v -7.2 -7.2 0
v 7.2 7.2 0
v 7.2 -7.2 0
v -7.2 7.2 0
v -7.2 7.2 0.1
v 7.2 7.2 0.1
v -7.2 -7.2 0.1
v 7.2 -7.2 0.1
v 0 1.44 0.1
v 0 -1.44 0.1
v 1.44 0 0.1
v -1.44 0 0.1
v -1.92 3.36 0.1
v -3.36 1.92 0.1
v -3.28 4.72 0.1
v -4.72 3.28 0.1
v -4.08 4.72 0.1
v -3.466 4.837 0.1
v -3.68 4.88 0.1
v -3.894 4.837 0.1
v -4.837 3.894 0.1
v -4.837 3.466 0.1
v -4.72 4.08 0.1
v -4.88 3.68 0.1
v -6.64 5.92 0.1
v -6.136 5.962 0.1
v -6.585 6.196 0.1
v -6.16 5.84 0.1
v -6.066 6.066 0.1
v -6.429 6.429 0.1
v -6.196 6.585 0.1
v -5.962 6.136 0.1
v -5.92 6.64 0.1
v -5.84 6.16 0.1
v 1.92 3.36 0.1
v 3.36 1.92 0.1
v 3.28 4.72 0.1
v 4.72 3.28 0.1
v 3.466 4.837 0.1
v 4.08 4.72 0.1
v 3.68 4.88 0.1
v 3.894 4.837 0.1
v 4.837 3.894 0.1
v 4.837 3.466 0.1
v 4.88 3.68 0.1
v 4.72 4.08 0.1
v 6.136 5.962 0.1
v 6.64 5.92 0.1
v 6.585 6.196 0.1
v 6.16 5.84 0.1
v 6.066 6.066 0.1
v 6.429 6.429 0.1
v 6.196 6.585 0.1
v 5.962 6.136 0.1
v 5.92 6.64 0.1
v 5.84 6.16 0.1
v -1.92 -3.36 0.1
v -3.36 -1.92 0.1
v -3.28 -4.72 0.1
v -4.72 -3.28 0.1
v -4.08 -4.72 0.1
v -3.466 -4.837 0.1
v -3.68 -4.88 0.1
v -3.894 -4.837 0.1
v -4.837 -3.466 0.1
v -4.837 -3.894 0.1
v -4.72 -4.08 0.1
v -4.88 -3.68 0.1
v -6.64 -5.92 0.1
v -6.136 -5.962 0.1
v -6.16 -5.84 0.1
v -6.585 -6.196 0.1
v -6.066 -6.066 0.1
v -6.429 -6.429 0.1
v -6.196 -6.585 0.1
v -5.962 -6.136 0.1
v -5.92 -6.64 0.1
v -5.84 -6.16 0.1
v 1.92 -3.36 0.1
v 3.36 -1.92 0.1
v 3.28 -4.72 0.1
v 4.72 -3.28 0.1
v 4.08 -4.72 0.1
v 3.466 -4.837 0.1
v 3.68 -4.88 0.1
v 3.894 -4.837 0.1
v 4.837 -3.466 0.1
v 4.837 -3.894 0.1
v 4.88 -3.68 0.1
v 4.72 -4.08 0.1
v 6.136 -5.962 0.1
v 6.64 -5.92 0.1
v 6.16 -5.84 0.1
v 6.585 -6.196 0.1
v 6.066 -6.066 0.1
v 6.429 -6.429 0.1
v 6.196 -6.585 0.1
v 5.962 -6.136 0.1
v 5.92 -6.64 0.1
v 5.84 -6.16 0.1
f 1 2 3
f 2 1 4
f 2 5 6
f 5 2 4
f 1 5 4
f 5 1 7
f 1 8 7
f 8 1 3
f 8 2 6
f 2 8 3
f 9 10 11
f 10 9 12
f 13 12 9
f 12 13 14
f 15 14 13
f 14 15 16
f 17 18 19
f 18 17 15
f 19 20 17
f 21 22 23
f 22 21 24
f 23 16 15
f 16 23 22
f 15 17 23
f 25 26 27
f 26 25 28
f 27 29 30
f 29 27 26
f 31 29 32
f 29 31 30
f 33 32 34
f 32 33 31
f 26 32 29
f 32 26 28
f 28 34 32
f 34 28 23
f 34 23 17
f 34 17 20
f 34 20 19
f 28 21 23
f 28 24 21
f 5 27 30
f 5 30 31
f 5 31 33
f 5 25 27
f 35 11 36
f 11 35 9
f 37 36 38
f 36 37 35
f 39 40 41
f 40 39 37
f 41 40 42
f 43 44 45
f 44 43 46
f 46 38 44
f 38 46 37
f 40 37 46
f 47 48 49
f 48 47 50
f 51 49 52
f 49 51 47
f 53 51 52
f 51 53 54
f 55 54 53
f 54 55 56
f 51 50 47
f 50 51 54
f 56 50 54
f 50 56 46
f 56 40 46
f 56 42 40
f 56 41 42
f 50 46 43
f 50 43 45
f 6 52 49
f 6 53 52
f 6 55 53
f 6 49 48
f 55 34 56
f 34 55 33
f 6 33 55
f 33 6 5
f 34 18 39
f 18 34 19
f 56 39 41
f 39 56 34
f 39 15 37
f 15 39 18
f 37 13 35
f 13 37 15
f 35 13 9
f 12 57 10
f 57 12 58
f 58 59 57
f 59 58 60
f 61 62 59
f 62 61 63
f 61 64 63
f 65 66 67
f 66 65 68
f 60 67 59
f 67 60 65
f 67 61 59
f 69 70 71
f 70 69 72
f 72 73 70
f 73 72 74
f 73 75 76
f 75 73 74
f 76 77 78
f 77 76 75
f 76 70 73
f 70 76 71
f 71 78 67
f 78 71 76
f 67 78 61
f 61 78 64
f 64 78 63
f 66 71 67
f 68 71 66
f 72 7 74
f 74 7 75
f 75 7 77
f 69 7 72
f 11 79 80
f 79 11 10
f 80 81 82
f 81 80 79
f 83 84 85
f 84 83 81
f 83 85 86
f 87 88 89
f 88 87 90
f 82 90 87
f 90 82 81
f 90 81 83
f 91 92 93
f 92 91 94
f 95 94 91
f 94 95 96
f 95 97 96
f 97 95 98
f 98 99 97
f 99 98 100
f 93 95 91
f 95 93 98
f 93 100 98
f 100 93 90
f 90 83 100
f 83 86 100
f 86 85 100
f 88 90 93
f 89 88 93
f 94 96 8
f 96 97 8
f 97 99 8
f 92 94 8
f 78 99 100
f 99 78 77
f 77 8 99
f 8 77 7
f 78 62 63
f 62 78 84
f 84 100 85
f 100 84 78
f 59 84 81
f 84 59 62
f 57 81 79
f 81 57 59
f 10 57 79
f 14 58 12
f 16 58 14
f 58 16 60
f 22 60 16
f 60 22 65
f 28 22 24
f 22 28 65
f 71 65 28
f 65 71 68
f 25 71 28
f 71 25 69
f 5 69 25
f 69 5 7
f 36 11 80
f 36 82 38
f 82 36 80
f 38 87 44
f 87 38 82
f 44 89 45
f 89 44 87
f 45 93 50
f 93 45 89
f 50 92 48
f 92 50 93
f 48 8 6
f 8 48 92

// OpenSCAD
// file: ../p/box5-12.scad
use <../lib.scad>
function ldraw_lib__box5_12() = [
// 0 Box with 5 Faces without Any Edges
// 0 Name: box5-12.dat
// 0 Author: Chris Dee [cwdee]
// 0 !LDRAW_ORG Primitive UPDATE 2009-02
// 0 !LICENSE Licensed under CC BY 4.0 : see CAreadme.txt
// 
// 0 BFC CERTIFY CCW
  [0,"BFC","CERTIFY"],
  [0,"BFC","CCW"],
// 
// 0 !HISTORY 2009-09-03 [PTadmin] Official Update 2009-02
// 
// 
// 4 16 1 1 1 1 1 -1 -1 1 -1 -1 1 1
  [4,16,1,1,1,1,1,-1,-1,1,-1,-1,1,1],
// 4 16 -1 0 1 1 0 1 1 1 1 -1 1 1
  [4,16,-1,0,1,1,0,1,1,1,1,-1,1,1],
// 4 16 -1 0 -1 -1 0 1 -1 1 1 -1 1 -1
  [4,16,-1,0,-1,-1,0,1,-1,1,1,-1,1,-1],
// 4 16 1 0 -1 -1 0 -1 -1 1 -1 1 1 -1
  [4,16,1,0,-1,-1,0,-1,-1,1,-1,1,1,-1],
// 4 16 1 0 1 1 0 -1 1 1 -1 1 1 1
  [4,16,1,0,1,1,0,-1,1,1,-1,1,1,1],
// 0
];
module ldraw_lib__box5_12(step=0, col=false, unit=2/5, alt=false, line=0.2, solid=!$preview)
    makepoly(ldraw_lib__box5_12(), step=step, col=col, unit=unit, alt=alt, line=line, solid=solid);
ldraw_lib__box5_12(line=0.2);
// main file
use <../lib.scad>
use <../p/box5-12.scad>
function ldraw_lib__4584252e() = [
// 0 Sticker  1.8 x  1.8 with White St. Andrews Cross with Red Tips in White Frame on Black Background
// 0 Name: 4584252e.dat
// 0 Author: Gerald Lasser [GeraldLasser]
// 0 !LDRAW_ORG Part UPDATE 2024-04
// 0 !LICENSE Licensed under CC BY 4.0 : see CAreadme.txt
// 
// 0 BFC CERTIFY CCW
  [0,"BFC","CERTIFY"],
  [0,"BFC","CCW"],
// 
// 0 !KEYWORDS Set 7936
// 
// 0 !HISTORY 2024-05-28 [OrionP] Official Update 2024-04
// 
// 
// 1 16 0 -.25 0 18 0 0 0 .25 0 0 0 18 box5-12.dat
  [1,16,0,-.25,0,18,0,0,0,.25,0,0,0,18, ldraw_lib__box5_12()],
// 
// 4 15 0 -.25 -3.6 3.6 -.25 0 0 -.25 3.6 -3.6 -.25 0
  [4,15,0,-.25,-3.6,3.6,-.25,0,0,-.25,3.6,-3.6,-.25,0],
// 4 15 -4.8 -.25 8.4 -8.4 -.25 4.8 -3.6 -.25 0 0 -.25 3.6
  [4,15,-4.8,-.25,8.4,-8.4,-.25,4.8,-3.6,-.25,0,0,-.25,3.6],
// 4 4 -8.4 -.25 4.8 -4.8 -.25 8.4 -8.2 -.25 11.8 -11.8 -.25 8.2
  [4,4,-8.4,-.25,4.8,-4.8,-.25,8.4,-8.2,-.25,11.8,-11.8,-.25,8.2],
// 4 4 -10.2 -.25 11.8 -8.2 -.25 11.8 -8.664 -.25 12.093 -9.2 -.25 12.2
  [4,4,-10.2,-.25,11.8,-8.2,-.25,11.8,-8.664,-.25,12.093,-9.2,-.25,12.2],
// 3 4 -9.2 -.25 12.2 -9.736 -.25 12.093 -10.2 -.25 11.8
  [3,4,-9.2,-.25,12.2,-9.736,-.25,12.093,-10.2,-.25,11.8],
// 4 4 -11.8 -.25 10.2 -12.093 -.25 9.736 -12.2 -.25 9.2 -12.093 -.25 8.664
  [4,4,-11.8,-.25,10.2,-12.093,-.25,9.736,-12.2,-.25,9.2,-12.093,-.25,8.664],
// 4 4 -11.8 -.25 10.2 -12.093 -.25 8.664 -11.8 -.25 8.2 -8.2 -.25 11.8
  [4,4,-11.8,-.25,10.2,-12.093,-.25,8.664,-11.8,-.25,8.2,-8.2,-.25,11.8],
// 3 4 -8.2 -.25 11.8 -10.2 -.25 11.8 -11.8 -.25 10.2
  [3,4,-8.2,-.25,11.8,-10.2,-.25,11.8,-11.8,-.25,10.2],
// 4 15 -16.6 -.25 14.8 -15.4 -.25 14.6 -15.339 -.25 14.906 -16.463 -.25 15.489
  [4,15,-16.6,-.25,14.8,-15.4,-.25,14.6,-15.339,-.25,14.906,-16.463,-.25,15.489],
// 4 15 -16.463 -.25 15.489 -15.339 -.25 14.906 -15.166 -.25 15.166 -16.073 -.25 16.073
  [4,15,-16.463,-.25,15.489,-15.339,-.25,14.906,-15.166,-.25,15.166,-16.073,-.25,16.073],
// 4 15 -16.073 -.25 16.073 -15.166 -.25 15.166 -14.906 -.25 15.339 -15.489 -.25 16.463
  [4,15,-16.073,-.25,16.073,-15.166,-.25,15.166,-14.906,-.25,15.339,-15.489,-.25,16.463],
// 4 15 -15.489 -.25 16.463 -14.906 -.25 15.339 -14.6 -.25 15.4 -14.8 -.25 16.6
  [4,15,-15.489,-.25,16.463,-14.906,-.25,15.339,-14.6,-.25,15.4,-14.8,-.25,16.6],
// 4 0 -15.166 -.25 15.166 -15.339 -.25 14.906 -15.4 -.25 14.6 -14.906 -.25 15.339
  [4,0,-15.166,-.25,15.166,-15.339,-.25,14.906,-15.4,-.25,14.6,-14.906,-.25,15.339],
// 4 0 -14.6 -.25 15.4 -14.906 -.25 15.339 -15.4 -.25 14.6 -11.8 -.25 10.2
  [4,0,-14.6,-.25,15.4,-14.906,-.25,15.339,-15.4,-.25,14.6,-11.8,-.25,10.2],
// 3 0 -14.6 -.25 15.4 -11.8 -.25 10.2 -10.2 -.25 11.8
  [3,0,-14.6,-.25,15.4,-11.8,-.25,10.2,-10.2,-.25,11.8],
// 3 0 -14.6 -.25 15.4 -10.2 -.25 11.8 -9.736 -.25 12.093
  [3,0,-14.6,-.25,15.4,-10.2,-.25,11.8,-9.736,-.25,12.093],
// 3 0 -14.6 -.25 15.4 -9.736 -.25 12.093 -9.2 -.25 12.2
  [3,0,-14.6,-.25,15.4,-9.736,-.25,12.093,-9.2,-.25,12.2],
// 3 0 -15.4 -.25 14.6 -12.093 -.25 9.736 -11.8 -.25 10.2
  [3,0,-15.4,-.25,14.6,-12.093,-.25,9.736,-11.8,-.25,10.2],
// 3 0 -15.4 -.25 14.6 -12.2 -.25 9.2 -12.093 -.25 9.736
  [3,0,-15.4,-.25,14.6,-12.2,-.25,9.2,-12.093,-.25,9.736],
// 3 0 -18 -.25 18 -16.463 -.25 15.489 -16.073 -.25 16.073
  [3,0,-18,-.25,18,-16.463,-.25,15.489,-16.073,-.25,16.073],
// 3 0 -18 -.25 18 -16.073 -.25 16.073 -15.489 -.25 16.463
  [3,0,-18,-.25,18,-16.073,-.25,16.073,-15.489,-.25,16.463],
// 3 0 -18 -.25 18 -15.489 -.25 16.463 -14.8 -.25 16.6
  [3,0,-18,-.25,18,-15.489,-.25,16.463,-14.8,-.25,16.6],
// 3 0 -18 -.25 18 -16.6 -.25 14.8 -16.463 -.25 15.489
  [3,0,-18,-.25,18,-16.6,-.25,14.8,-16.463,-.25,15.489],
// 4 15 0 -.25 3.6 3.6 -.25 0 8.4 -.25 4.8 4.8 -.25 8.4
  [4,15,0,-.25,3.6,3.6,-.25,0,8.4,-.25,4.8,4.8,-.25,8.4],
// 4 4 8.2 -.25 11.8 4.8 -.25 8.4 8.4 -.25 4.8 11.8 -.25 8.2
  [4,4,8.2,-.25,11.8,4.8,-.25,8.4,8.4,-.25,4.8,11.8,-.25,8.2],
// 4 4 8.664 -.25 12.093 8.2 -.25 11.8 10.2 -.25 11.8 9.2 -.25 12.2
  [4,4,8.664,-.25,12.093,8.2,-.25,11.8,10.2,-.25,11.8,9.2,-.25,12.2],
// 3 4 9.2 -.25 12.2 10.2 -.25 11.8 9.736 -.25 12.093
  [3,4,9.2,-.25,12.2,10.2,-.25,11.8,9.736,-.25,12.093],
// 4 4 12.2 -.25 9.2 12.093 -.25 9.736 11.8 -.25 10.2 12.093 -.25 8.664
  [4,4,12.2,-.25,9.2,12.093,-.25,9.736,11.8,-.25,10.2,12.093,-.25,8.664],
// 4 4 11.8 -.25 8.2 12.093 -.25 8.664 11.8 -.25 10.2 8.2 -.25 11.8
  [4,4,11.8,-.25,8.2,12.093,-.25,8.664,11.8,-.25,10.2,8.2,-.25,11.8],
// 3 4 10.2 -.25 11.8 8.2 -.25 11.8 11.8 -.25 10.2
  [3,4,10.2,-.25,11.8,8.2,-.25,11.8,11.8,-.25,10.2],
// 4 15 15.339 -.25 14.906 15.4 -.25 14.6 16.6 -.25 14.8 16.463 -.25 15.489
  [4,15,15.339,-.25,14.906,15.4,-.25,14.6,16.6,-.25,14.8,16.463,-.25,15.489],
// 4 15 15.166 -.25 15.166 15.339 -.25 14.906 16.463 -.25 15.489 16.073 -.25 16.073
  [4,15,15.166,-.25,15.166,15.339,-.25,14.906,16.463,-.25,15.489,16.073,-.25,16.073],
// 4 15 14.906 -.25 15.339 15.166 -.25 15.166 16.073 -.25 16.073 15.489 -.25 16.463
  [4,15,14.906,-.25,15.339,15.166,-.25,15.166,16.073,-.25,16.073,15.489,-.25,16.463],
// 4 15 14.6 -.25 15.4 14.906 -.25 15.339 15.489 -.25 16.463 14.8 -.25 16.6
  [4,15,14.6,-.25,15.4,14.906,-.25,15.339,15.489,-.25,16.463,14.8,-.25,16.6],
// 4 0 15.4 -.25 14.6 15.339 -.25 14.906 15.166 -.25 15.166 14.906 -.25 15.339
  [4,0,15.4,-.25,14.6,15.339,-.25,14.906,15.166,-.25,15.166,14.906,-.25,15.339],
// 4 0 15.4 -.25 14.6 14.906 -.25 15.339 14.6 -.25 15.4 11.8 -.25 10.2
  [4,0,15.4,-.25,14.6,14.906,-.25,15.339,14.6,-.25,15.4,11.8,-.25,10.2],
// 3 0 14.6 -.25 15.4 10.2 -.25 11.8 11.8 -.25 10.2
  [3,0,14.6,-.25,15.4,10.2,-.25,11.8,11.8,-.25,10.2],
// 3 0 14.6 -.25 15.4 9.736 -.25 12.093 10.2 -.25 11.8
  [3,0,14.6,-.25,15.4,9.736,-.25,12.093,10.2,-.25,11.8],
// 3 0 14.6 -.25 15.4 9.2 -.25 12.2 9.736 -.25 12.093
  [3,0,14.6,-.25,15.4,9.2,-.25,12.2,9.736,-.25,12.093],
// 3 0 15.4 -.25 14.6 11.8 -.25 10.2 12.093 -.25 9.736
  [3,0,15.4,-.25,14.6,11.8,-.25,10.2,12.093,-.25,9.736],
// 3 0 15.4 -.25 14.6 12.093 -.25 9.736 12.2 -.25 9.2
  [3,0,15.4,-.25,14.6,12.093,-.25,9.736,12.2,-.25,9.2],
// 3 0 18 -.25 18 16.073 -.25 16.073 16.463 -.25 15.489
  [3,0,18,-.25,18,16.073,-.25,16.073,16.463,-.25,15.489],
// 3 0 18 -.25 18 15.489 -.25 16.463 16.073 -.25 16.073
  [3,0,18,-.25,18,15.489,-.25,16.463,16.073,-.25,16.073],
// 3 0 18 -.25 18 14.8 -.25 16.6 15.489 -.25 16.463
  [3,0,18,-.25,18,14.8,-.25,16.6,15.489,-.25,16.463],
// 3 0 18 -.25 18 16.463 -.25 15.489 16.6 -.25 14.8
  [3,0,18,-.25,18,16.463,-.25,15.489,16.6,-.25,14.8],
// 4 15 -14.8 -.25 16.6 -14.6 -.25 15.4 14.6 -.25 15.4 14.8 -.25 16.6
  [4,15,-14.8,-.25,16.6,-14.6,-.25,15.4,14.6,-.25,15.4,14.8,-.25,16.6],
// 4 0 -18 -.25 18 -14.8 -.25 16.6 14.8 -.25 16.6 18 -.25 18
  [4,0,-18,-.25,18,-14.8,-.25,16.6,14.8,-.25,16.6,18,-.25,18],
// 4 0 -14.6 -.25 15.4 -9.2 -.25 12.2 -8.664 -.25 12.093 8.664 -.25 12.093
  [4,0,-14.6,-.25,15.4,-9.2,-.25,12.2,-8.664,-.25,12.093,8.664,-.25,12.093],
// 4 0 14.6 -.25 15.4 -14.6 -.25 15.4 8.664 -.25 12.093 9.2 -.25 12.2
  [4,0,14.6,-.25,15.4,-14.6,-.25,15.4,8.664,-.25,12.093,9.2,-.25,12.2],
// 4 0 -8.664 -.25 12.093 -8.2 -.25 11.8 8.2 -.25 11.8 8.664 -.25 12.093
  [4,0,-8.664,-.25,12.093,-8.2,-.25,11.8,8.2,-.25,11.8,8.664,-.25,12.093],
// 4 0 -8.2 -.25 11.8 -4.8 -.25 8.4 4.8 -.25 8.4 8.2 -.25 11.8
  [4,0,-8.2,-.25,11.8,-4.8,-.25,8.4,4.8,-.25,8.4,8.2,-.25,11.8],
// 3 0 4.8 -.25 8.4 -4.8 -.25 8.4 0 -.25 3.6
  [3,0,4.8,-.25,8.4,-4.8,-.25,8.4,0,-.25,3.6],
// 4 15 -3.6 -.25 0 -8.4 -.25 -4.8 -4.8 -.25 -8.4 0 -.25 -3.6
  [4,15,-3.6,-.25,0,-8.4,-.25,-4.8,-4.8,-.25,-8.4,0,-.25,-3.6],
// 4 4 -8.2 -.25 -11.8 -4.8 -.25 -8.4 -8.4 -.25 -4.8 -11.8 -.25 -8.2
  [4,4,-8.2,-.25,-11.8,-4.8,-.25,-8.4,-8.4,-.25,-4.8,-11.8,-.25,-8.2],
// 4 4 -8.664 -.25 -12.093 -8.2 -.25 -11.8 -10.2 -.25 -11.8 -9.2 -.25 -12.2
  [4,4,-8.664,-.25,-12.093,-8.2,-.25,-11.8,-10.2,-.25,-11.8,-9.2,-.25,-12.2],
// 3 4 -10.2 -.25 -11.8 -9.736 -.25 -12.093 -9.2 -.25 -12.2
  [3,4,-10.2,-.25,-11.8,-9.736,-.25,-12.093,-9.2,-.25,-12.2],
// 4 4 -12.2 -.25 -9.2 -12.093 -.25 -9.736 -11.8 -.25 -10.2 -12.093 -.25 -8.664
  [4,4,-12.2,-.25,-9.2,-12.093,-.25,-9.736,-11.8,-.25,-10.2,-12.093,-.25,-8.664],
// 4 4 -11.8 -.25 -8.2 -12.093 -.25 -8.664 -11.8 -.25 -10.2 -8.2 -.25 -11.8
  [4,4,-11.8,-.25,-8.2,-12.093,-.25,-8.664,-11.8,-.25,-10.2,-8.2,-.25,-11.8],
// 3 4 -11.8 -.25 -10.2 -10.2 -.25 -11.8 -8.2 -.25 -11.8
  [3,4,-11.8,-.25,-10.2,-10.2,-.25,-11.8,-8.2,-.25,-11.8],
// 4 15 -15.339 -.25 -14.906 -15.4 -.25 -14.6 -16.6 -.25 -14.8 -16.463 -.25 -15.489
  [4,15,-15.339,-.25,-14.906,-15.4,-.25,-14.6,-16.6,-.25,-14.8,-16.463,-.25,-15.489],
// 4 15 -15.166 -.25 -15.166 -15.339 -.25 -14.906 -16.463 -.25 -15.489 -16.073 -.25 -16.073
  [4,15,-15.166,-.25,-15.166,-15.339,-.25,-14.906,-16.463,-.25,-15.489,-16.073,-.25,-16.073],
// 4 15 -14.906 -.25 -15.339 -15.166 -.25 -15.166 -16.073 -.25 -16.073 -15.489 -.25 -16.463
  [4,15,-14.906,-.25,-15.339,-15.166,-.25,-15.166,-16.073,-.25,-16.073,-15.489,-.25,-16.463],
// 4 15 -14.6 -.25 -15.4 -14.906 -.25 -15.339 -15.489 -.25 -16.463 -14.8 -.25 -16.6
  [4,15,-14.6,-.25,-15.4,-14.906,-.25,-15.339,-15.489,-.25,-16.463,-14.8,-.25,-16.6],
// 4 0 -15.4 -.25 -14.6 -15.339 -.25 -14.906 -15.166 -.25 -15.166 -14.906 -.25 -15.339
  [4,0,-15.4,-.25,-14.6,-15.339,-.25,-14.906,-15.166,-.25,-15.166,-14.906,-.25,-15.339],
// 4 0 -15.4 -.25 -14.6 -14.906 -.25 -15.339 -14.6 -.25 -15.4 -11.8 -.25 -10.2
  [4,0,-15.4,-.25,-14.6,-14.906,-.25,-15.339,-14.6,-.25,-15.4,-11.8,-.25,-10.2],
// 3 0 -11.8 -.25 -10.2 -14.6 -.25 -15.4 -10.2 -.25 -11.8
  [3,0,-11.8,-.25,-10.2,-14.6,-.25,-15.4,-10.2,-.25,-11.8],
// 3 0 -10.2 -.25 -11.8 -14.6 -.25 -15.4 -9.736 -.25 -12.093
  [3,0,-10.2,-.25,-11.8,-14.6,-.25,-15.4,-9.736,-.25,-12.093],
// 3 0 -9.736 -.25 -12.093 -14.6 -.25 -15.4 -9.2 -.25 -12.2
  [3,0,-9.736,-.25,-12.093,-14.6,-.25,-15.4,-9.2,-.25,-12.2],
// 3 0 -12.093 -.25 -9.736 -15.4 -.25 -14.6 -11.8 -.25 -10.2
  [3,0,-12.093,-.25,-9.736,-15.4,-.25,-14.6,-11.8,-.25,-10.2],
// 3 0 -12.2 -.25 -9.2 -15.4 -.25 -14.6 -12.093 -.25 -9.736
  [3,0,-12.2,-.25,-9.2,-15.4,-.25,-14.6,-12.093,-.25,-9.736],
// 3 0 -16.463 -.25 -15.489 -18 -.25 -18 -16.073 -.25 -16.073
  [3,0,-16.463,-.25,-15.489,-18,-.25,-18,-16.073,-.25,-16.073],
// 3 0 -16.073 -.25 -16.073 -18 -.25 -18 -15.489 -.25 -16.463
  [3,0,-16.073,-.25,-16.073,-18,-.25,-18,-15.489,-.25,-16.463],
// 3 0 -15.489 -.25 -16.463 -18 -.25 -18 -14.8 -.25 -16.6
  [3,0,-15.489,-.25,-16.463,-18,-.25,-18,-14.8,-.25,-16.6],
// 3 0 -16.6 -.25 -14.8 -18 -.25 -18 -16.463 -.25 -15.489
  [3,0,-16.6,-.25,-14.8,-18,-.25,-18,-16.463,-.25,-15.489],
// 4 15 8.4 -.25 -4.8 3.6 -.25 0 0 -.25 -3.6 4.8 -.25 -8.4
  [4,15,8.4,-.25,-4.8,3.6,-.25,0,0,-.25,-3.6,4.8,-.25,-8.4],
// 4 4 8.4 -.25 -4.8 4.8 -.25 -8.4 8.2 -.25 -11.8 11.8 -.25 -8.2
  [4,4,8.4,-.25,-4.8,4.8,-.25,-8.4,8.2,-.25,-11.8,11.8,-.25,-8.2],
// 4 4 10.2 -.25 -11.8 8.2 -.25 -11.8 8.664 -.25 -12.093 9.2 -.25 -12.2
  [4,4,10.2,-.25,-11.8,8.2,-.25,-11.8,8.664,-.25,-12.093,9.2,-.25,-12.2],
// 3 4 10.2 -.25 -11.8 9.2 -.25 -12.2 9.736 -.25 -12.093
  [3,4,10.2,-.25,-11.8,9.2,-.25,-12.2,9.736,-.25,-12.093],
// 4 4 11.8 -.25 -10.2 12.093 -.25 -9.736 12.2 -.25 -9.2 12.093 -.25 -8.664
  [4,4,11.8,-.25,-10.2,12.093,-.25,-9.736,12.2,-.25,-9.2,12.093,-.25,-8.664],
// 4 4 11.8 -.25 -10.2 12.093 -.25 -8.664 11.8 -.25 -8.2 8.2 -.25 -11.8
  [4,4,11.8,-.25,-10.2,12.093,-.25,-8.664,11.8,-.25,-8.2,8.2,-.25,-11.8],
// 3 4 11.8 -.25 -10.2 8.2 -.25 -11.8 10.2 -.25 -11.8
  [3,4,11.8,-.25,-10.2,8.2,-.25,-11.8,10.2,-.25,-11.8],
// 4 15 16.6 -.25 -14.8 15.4 -.25 -14.6 15.339 -.25 -14.906 16.463 -.25 -15.489
  [4,15,16.6,-.25,-14.8,15.4,-.25,-14.6,15.339,-.25,-14.906,16.463,-.25,-15.489],
// 4 15 16.463 -.25 -15.489 15.339 -.25 -14.906 15.166 -.25 -15.166 16.073 -.25 -16.073
  [4,15,16.463,-.25,-15.489,15.339,-.25,-14.906,15.166,-.25,-15.166,16.073,-.25,-16.073],
// 4 15 16.073 -.25 -16.073 15.166 -.25 -15.166 14.906 -.25 -15.339 15.489 -.25 -16.463
  [4,15,16.073,-.25,-16.073,15.166,-.25,-15.166,14.906,-.25,-15.339,15.489,-.25,-16.463],
// 4 15 15.489 -.25 -16.463 14.906 -.25 -15.339 14.6 -.25 -15.4 14.8 -.25 -16.6
  [4,15,15.489,-.25,-16.463,14.906,-.25,-15.339,14.6,-.25,-15.4,14.8,-.25,-16.6],
// 4 0 15.166 -.25 -15.166 15.339 -.25 -14.906 15.4 -.25 -14.6 14.906 -.25 -15.339
  [4,0,15.166,-.25,-15.166,15.339,-.25,-14.906,15.4,-.25,-14.6,14.906,-.25,-15.339],
// 4 0 14.6 -.25 -15.4 14.906 -.25 -15.339 15.4 -.25 -14.6 11.8 -.25 -10.2
  [4,0,14.6,-.25,-15.4,14.906,-.25,-15.339,15.4,-.25,-14.6,11.8,-.25,-10.2],
// 3 0 11.8 -.25 -10.2 10.2 -.25 -11.8 14.6 -.25 -15.4
  [3,0,11.8,-.25,-10.2,10.2,-.25,-11.8,14.6,-.25,-15.4],
// 3 0 10.2 -.25 -11.8 9.736 -.25 -12.093 14.6 -.25 -15.4
  [3,0,10.2,-.25,-11.8,9.736,-.25,-12.093,14.6,-.25,-15.4],
// 3 0 9.736 -.25 -12.093 9.2 -.25 -12.2 14.6 -.25 -15.4
  [3,0,9.736,-.25,-12.093,9.2,-.25,-12.2,14.6,-.25,-15.4],
// 3 0 12.093 -.25 -9.736 11.8 -.25 -10.2 15.4 -.25 -14.6
  [3,0,12.093,-.25,-9.736,11.8,-.25,-10.2,15.4,-.25,-14.6],
// 3 0 12.2 -.25 -9.2 12.093 -.25 -9.736 15.4 -.25 -14.6
  [3,0,12.2,-.25,-9.2,12.093,-.25,-9.736,15.4,-.25,-14.6],
// 3 0 16.463 -.25 -15.489 16.073 -.25 -16.073 18 -.25 -18
  [3,0,16.463,-.25,-15.489,16.073,-.25,-16.073,18,-.25,-18],
// 3 0 16.073 -.25 -16.073 15.489 -.25 -16.463 18 -.25 -18
  [3,0,16.073,-.25,-16.073,15.489,-.25,-16.463,18,-.25,-18],
// 3 0 15.489 -.25 -16.463 14.8 -.25 -16.6 18 -.25 -18
  [3,0,15.489,-.25,-16.463,14.8,-.25,-16.6,18,-.25,-18],
// 3 0 16.6 -.25 -14.8 16.463 -.25 -15.489 18 -.25 -18
  [3,0,16.6,-.25,-14.8,16.463,-.25,-15.489,18,-.25,-18],
// 4 15 14.6 -.25 -15.4 -14.6 -.25 -15.4 -14.8 -.25 -16.6 14.8 -.25 -16.6
  [4,15,14.6,-.25,-15.4,-14.6,-.25,-15.4,-14.8,-.25,-16.6,14.8,-.25,-16.6],
// 4 0 14.8 -.25 -16.6 -14.8 -.25 -16.6 -18 -.25 -18 18 -.25 -18
  [4,0,14.8,-.25,-16.6,-14.8,-.25,-16.6,-18,-.25,-18,18,-.25,-18],
// 4 0 -8.664 -.25 -12.093 -9.2 -.25 -12.2 -14.6 -.25 -15.4 8.664 -.25 -12.093
  [4,0,-8.664,-.25,-12.093,-9.2,-.25,-12.2,-14.6,-.25,-15.4,8.664,-.25,-12.093],
// 4 0 8.664 -.25 -12.093 -14.6 -.25 -15.4 14.6 -.25 -15.4 9.2 -.25 -12.2
  [4,0,8.664,-.25,-12.093,-14.6,-.25,-15.4,14.6,-.25,-15.4,9.2,-.25,-12.2],
// 4 0 8.2 -.25 -11.8 -8.2 -.25 -11.8 -8.664 -.25 -12.093 8.664 -.25 -12.093
  [4,0,8.2,-.25,-11.8,-8.2,-.25,-11.8,-8.664,-.25,-12.093,8.664,-.25,-12.093],
// 4 0 4.8 -.25 -8.4 -4.8 -.25 -8.4 -8.2 -.25 -11.8 8.2 -.25 -11.8
  [4,0,4.8,-.25,-8.4,-4.8,-.25,-8.4,-8.2,-.25,-11.8,8.2,-.25,-11.8],
// 3 0 0 -.25 -3.6 -4.8 -.25 -8.4 4.8 -.25 -8.4
  [3,0,0,-.25,-3.6,-4.8,-.25,-8.4,4.8,-.25,-8.4],
// 3 0 -8.4 -.25 4.8 -8.4 -.25 -4.8 -3.6 -.25 0
  [3,0,-8.4,-.25,4.8,-8.4,-.25,-4.8,-3.6,-.25,0],
// 4 0 -8.4 -.25 -4.8 -8.4 -.25 4.8 -11.8 -.25 8.2 -11.8 -.25 -8.2
  [4,0,-8.4,-.25,-4.8,-8.4,-.25,4.8,-11.8,-.25,8.2,-11.8,-.25,-8.2],
// 4 0 -12.093 -.25 -8.664 -11.8 -.25 -8.2 -11.8 -.25 8.2 -12.093 -.25 8.664
  [4,0,-12.093,-.25,-8.664,-11.8,-.25,-8.2,-11.8,-.25,8.2,-12.093,-.25,8.664],
// 4 0 -12.093 -.25 8.664 -12.2 -.25 9.2 -15.4 -.25 14.6 -12.093 -.25 -8.664
  [4,0,-12.093,-.25,8.664,-12.2,-.25,9.2,-15.4,-.25,14.6,-12.093,-.25,-8.664],
// 4 0 -12.093 -.25 -8.664 -15.4 -.25 14.6 -15.4 -.25 -14.6 -12.2 -.25 -9.2
  [4,0,-12.093,-.25,-8.664,-15.4,-.25,14.6,-15.4,-.25,-14.6,-12.2,-.25,-9.2],
// 4 15 -16.6 -.25 -14.8 -15.4 -.25 -14.6 -15.4 -.25 14.6 -16.6 -.25 14.8
  [4,15,-16.6,-.25,-14.8,-15.4,-.25,-14.6,-15.4,-.25,14.6,-16.6,-.25,14.8],
// 4 0 -16.6 -.25 -14.8 -16.6 -.25 14.8 -18 -.25 18 -18 -.25 -18
  [4,0,-16.6,-.25,-14.8,-16.6,-.25,14.8,-18,-.25,18,-18,-.25,-18],
// 3 0 8.4 -.25 4.8 3.6 -.25 0 8.4 -.25 -4.8
  [3,0,8.4,-.25,4.8,3.6,-.25,0,8.4,-.25,-4.8],
// 4 0 11.8 -.25 8.2 8.4 -.25 4.8 8.4 -.25 -4.8 11.8 -.25 -8.2
  [4,0,11.8,-.25,8.2,8.4,-.25,4.8,8.4,-.25,-4.8,11.8,-.25,-8.2],
// 4 0 12.093 -.25 8.664 11.8 -.25 8.2 11.8 -.25 -8.2 12.093 -.25 -8.664
  [4,0,12.093,-.25,8.664,11.8,-.25,8.2,11.8,-.25,-8.2,12.093,-.25,-8.664],
// 4 0 12.093 -.25 8.664 12.093 -.25 -8.664 12.2 -.25 -9.2 12.2 -.25 9.2
  [4,0,12.093,-.25,8.664,12.093,-.25,-8.664,12.2,-.25,-9.2,12.2,-.25,9.2],
// 4 0 15.4 -.25 14.6 12.2 -.25 9.2 12.2 -.25 -9.2 15.4 -.25 -14.6
  [4,0,15.4,-.25,14.6,12.2,-.25,9.2,12.2,-.25,-9.2,15.4,-.25,-14.6],
// 4 15 15.4 -.25 14.6 15.4 -.25 -14.6 16.6 -.25 -14.8 16.6 -.25 14.8
  [4,15,15.4,-.25,14.6,15.4,-.25,-14.6,16.6,-.25,-14.8,16.6,-.25,14.8],
// 4 0 18 -.25 18 16.6 -.25 14.8 16.6 -.25 -14.8 18 -.25 -18
  [4,0,18,-.25,18,16.6,-.25,14.8,16.6,-.25,-14.8,18,-.25,-18],
];
module ldraw_lib__4584252e(step=0, col=false, unit=2/5, alt=false, line=0.2, solid=!$preview)
    makepoly(ldraw_lib__4584252e(), step=step, col=col, unit=unit, alt=alt, line=line, solid=solid);
ldraw_lib__4584252e(line=0.2);
